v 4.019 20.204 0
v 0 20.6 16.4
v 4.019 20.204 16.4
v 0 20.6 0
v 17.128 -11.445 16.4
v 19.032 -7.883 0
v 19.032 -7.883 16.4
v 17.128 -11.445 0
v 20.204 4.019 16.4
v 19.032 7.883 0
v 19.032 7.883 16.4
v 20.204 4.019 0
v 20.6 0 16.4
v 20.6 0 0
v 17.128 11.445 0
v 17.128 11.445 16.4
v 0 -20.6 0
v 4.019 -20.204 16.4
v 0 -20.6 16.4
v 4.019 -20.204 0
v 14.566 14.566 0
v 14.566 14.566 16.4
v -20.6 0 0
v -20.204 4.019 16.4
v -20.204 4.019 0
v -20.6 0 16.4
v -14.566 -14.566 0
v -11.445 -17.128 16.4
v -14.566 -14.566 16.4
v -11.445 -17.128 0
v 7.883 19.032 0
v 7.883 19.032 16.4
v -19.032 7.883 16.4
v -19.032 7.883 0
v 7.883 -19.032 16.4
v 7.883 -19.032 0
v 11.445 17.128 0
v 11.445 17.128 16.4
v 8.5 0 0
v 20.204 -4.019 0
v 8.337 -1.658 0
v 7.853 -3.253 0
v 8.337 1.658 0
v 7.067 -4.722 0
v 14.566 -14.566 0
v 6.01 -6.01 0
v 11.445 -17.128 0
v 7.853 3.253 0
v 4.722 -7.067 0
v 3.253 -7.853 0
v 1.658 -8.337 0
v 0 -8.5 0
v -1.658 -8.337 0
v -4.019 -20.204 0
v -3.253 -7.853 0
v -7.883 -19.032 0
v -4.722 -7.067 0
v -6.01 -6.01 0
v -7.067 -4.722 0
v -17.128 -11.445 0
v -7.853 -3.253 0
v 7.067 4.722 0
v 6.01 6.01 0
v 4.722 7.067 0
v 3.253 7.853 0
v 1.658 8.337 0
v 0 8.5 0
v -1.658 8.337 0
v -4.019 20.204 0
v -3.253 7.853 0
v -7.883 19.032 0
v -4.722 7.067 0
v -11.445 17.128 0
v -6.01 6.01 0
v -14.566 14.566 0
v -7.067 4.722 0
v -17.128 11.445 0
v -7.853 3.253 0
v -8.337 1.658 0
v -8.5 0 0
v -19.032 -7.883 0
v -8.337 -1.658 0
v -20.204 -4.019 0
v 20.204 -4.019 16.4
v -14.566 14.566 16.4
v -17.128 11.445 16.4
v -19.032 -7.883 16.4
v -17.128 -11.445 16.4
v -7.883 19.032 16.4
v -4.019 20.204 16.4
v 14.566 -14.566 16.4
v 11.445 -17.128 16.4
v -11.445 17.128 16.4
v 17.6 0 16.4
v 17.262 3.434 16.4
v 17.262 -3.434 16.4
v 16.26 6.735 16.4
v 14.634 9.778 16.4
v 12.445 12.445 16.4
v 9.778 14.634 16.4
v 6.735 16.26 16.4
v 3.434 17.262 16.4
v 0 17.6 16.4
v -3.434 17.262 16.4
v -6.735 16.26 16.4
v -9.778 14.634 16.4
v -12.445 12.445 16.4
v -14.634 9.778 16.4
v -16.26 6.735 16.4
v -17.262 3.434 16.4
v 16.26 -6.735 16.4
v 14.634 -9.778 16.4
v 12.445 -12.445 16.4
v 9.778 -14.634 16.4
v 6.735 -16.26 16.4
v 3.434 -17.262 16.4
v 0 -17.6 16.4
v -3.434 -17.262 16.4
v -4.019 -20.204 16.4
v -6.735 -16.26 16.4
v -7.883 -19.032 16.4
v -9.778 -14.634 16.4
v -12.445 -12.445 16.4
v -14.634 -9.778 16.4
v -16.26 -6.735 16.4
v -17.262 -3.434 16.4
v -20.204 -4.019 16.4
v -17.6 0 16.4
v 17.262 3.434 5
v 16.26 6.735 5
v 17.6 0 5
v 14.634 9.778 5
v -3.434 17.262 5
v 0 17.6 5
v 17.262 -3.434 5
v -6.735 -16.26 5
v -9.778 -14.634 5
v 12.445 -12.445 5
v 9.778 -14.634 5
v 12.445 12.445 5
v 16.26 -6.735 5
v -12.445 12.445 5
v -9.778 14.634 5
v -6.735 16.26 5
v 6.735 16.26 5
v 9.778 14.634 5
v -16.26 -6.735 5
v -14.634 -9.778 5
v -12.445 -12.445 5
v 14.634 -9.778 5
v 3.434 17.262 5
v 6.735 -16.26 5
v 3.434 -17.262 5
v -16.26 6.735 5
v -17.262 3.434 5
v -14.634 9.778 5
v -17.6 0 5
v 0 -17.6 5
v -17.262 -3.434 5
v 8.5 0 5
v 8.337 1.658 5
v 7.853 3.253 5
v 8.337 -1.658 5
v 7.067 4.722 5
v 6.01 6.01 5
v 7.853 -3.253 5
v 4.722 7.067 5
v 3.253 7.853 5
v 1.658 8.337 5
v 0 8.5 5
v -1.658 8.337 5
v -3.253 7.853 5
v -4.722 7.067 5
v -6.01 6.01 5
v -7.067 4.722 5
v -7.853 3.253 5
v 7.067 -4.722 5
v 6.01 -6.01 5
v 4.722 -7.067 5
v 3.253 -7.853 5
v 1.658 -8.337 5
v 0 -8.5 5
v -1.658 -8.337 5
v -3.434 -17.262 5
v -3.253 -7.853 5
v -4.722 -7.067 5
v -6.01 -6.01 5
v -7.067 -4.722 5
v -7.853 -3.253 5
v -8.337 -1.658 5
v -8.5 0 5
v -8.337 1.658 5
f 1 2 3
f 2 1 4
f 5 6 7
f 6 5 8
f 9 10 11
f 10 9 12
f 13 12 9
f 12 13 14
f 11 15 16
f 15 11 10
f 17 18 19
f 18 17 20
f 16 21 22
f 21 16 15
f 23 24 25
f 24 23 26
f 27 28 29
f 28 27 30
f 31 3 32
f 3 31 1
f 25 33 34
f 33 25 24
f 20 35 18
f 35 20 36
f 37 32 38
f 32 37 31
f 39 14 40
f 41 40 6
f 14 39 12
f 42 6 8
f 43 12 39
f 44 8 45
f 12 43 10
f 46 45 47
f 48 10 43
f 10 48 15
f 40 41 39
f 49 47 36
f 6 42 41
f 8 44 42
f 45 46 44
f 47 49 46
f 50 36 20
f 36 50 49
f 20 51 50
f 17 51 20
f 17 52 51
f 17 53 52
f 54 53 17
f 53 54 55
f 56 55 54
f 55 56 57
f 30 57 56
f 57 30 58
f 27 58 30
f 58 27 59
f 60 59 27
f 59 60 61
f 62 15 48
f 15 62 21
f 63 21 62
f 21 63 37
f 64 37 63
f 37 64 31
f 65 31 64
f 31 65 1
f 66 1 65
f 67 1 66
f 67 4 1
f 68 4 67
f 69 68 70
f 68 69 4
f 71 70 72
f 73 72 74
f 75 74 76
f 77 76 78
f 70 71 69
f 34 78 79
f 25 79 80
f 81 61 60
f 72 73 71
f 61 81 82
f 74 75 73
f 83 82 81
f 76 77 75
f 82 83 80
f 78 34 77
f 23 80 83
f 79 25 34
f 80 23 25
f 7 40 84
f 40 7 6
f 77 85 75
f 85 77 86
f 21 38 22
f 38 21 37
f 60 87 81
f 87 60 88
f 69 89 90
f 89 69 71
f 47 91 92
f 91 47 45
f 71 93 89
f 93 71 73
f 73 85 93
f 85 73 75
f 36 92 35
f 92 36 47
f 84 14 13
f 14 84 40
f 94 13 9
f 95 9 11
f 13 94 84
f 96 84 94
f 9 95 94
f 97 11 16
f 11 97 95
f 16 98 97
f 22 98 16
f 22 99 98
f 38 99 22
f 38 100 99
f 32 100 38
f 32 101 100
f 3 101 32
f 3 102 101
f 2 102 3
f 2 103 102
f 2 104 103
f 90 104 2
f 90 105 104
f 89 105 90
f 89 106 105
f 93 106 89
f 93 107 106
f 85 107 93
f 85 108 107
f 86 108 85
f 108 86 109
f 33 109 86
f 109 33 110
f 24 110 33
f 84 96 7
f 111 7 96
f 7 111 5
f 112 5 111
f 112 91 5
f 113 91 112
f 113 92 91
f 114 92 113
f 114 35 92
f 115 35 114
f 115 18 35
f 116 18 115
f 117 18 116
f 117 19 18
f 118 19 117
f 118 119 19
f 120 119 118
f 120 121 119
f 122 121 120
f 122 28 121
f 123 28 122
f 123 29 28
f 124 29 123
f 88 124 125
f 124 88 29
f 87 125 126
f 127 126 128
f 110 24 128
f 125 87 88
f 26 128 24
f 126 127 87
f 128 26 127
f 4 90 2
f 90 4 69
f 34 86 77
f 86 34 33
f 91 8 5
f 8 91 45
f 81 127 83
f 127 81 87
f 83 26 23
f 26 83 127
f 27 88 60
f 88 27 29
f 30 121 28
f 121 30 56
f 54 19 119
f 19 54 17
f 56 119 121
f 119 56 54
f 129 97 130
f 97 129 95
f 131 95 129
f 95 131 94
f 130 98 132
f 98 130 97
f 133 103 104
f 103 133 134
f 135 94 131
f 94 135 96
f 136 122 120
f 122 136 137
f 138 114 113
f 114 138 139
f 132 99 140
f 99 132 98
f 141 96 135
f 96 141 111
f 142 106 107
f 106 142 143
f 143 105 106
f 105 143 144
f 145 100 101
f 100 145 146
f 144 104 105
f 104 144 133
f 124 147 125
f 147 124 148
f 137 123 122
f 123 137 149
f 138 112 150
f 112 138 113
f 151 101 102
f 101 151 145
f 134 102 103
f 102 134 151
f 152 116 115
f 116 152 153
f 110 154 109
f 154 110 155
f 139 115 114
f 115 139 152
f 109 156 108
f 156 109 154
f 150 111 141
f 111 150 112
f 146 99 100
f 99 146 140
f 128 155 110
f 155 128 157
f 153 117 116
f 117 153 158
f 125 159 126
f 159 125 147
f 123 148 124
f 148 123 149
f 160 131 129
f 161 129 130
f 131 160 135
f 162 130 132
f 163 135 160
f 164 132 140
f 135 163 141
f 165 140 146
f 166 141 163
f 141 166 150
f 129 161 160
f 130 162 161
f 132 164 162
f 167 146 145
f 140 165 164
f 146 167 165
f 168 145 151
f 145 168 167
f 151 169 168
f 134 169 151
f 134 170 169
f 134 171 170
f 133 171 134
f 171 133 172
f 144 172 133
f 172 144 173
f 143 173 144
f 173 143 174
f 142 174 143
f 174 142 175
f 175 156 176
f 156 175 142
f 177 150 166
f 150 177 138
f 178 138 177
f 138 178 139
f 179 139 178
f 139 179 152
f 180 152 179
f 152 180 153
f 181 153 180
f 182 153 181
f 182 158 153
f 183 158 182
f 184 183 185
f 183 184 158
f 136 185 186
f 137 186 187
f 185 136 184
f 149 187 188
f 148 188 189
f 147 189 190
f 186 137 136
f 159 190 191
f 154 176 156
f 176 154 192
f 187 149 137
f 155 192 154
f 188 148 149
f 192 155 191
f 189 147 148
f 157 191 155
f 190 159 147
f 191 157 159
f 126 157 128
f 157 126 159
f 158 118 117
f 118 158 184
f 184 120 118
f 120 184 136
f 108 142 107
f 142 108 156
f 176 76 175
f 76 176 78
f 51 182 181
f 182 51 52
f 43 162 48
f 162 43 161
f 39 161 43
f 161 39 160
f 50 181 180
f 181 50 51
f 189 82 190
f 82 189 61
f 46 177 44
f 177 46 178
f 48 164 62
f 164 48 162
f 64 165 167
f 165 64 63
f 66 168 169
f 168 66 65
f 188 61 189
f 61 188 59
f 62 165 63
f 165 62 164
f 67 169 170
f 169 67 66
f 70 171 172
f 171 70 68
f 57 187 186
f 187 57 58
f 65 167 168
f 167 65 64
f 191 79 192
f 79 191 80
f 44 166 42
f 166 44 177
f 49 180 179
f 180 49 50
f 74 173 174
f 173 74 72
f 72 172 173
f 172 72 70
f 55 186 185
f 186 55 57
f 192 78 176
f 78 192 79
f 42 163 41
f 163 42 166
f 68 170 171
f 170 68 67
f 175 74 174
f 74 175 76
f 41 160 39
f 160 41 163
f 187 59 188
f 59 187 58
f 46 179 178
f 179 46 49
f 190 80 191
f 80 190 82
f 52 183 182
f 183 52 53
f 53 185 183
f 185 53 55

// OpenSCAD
$fn = 32;

// ----------------------------------------------------------------------
// Bearing housing: seat for 6202 (35 x 11 mm), 41.2 mm body
// ----------------------------------------------------------------------

// --- parameters (mm) ---
housing_d = 41.2;         // housing outside diameter
housing_h = 16.4;         // overall housing height
wall_t = 3;               // wall thickness
seat_d = 35.2;            // 6202 seat, 0.2 mm clearance
seat_h = 11.4;            // pocket depth
shoulder = 5;             // shoulder under the bearing
pass_d = 17;              // shaft passage

module body() {
  cylinder(h = housing_h, d = housing_d);
}

difference() {
  union() {
    body();
  }
  translate([0, 0, housing_h - seat_h]) cylinder(h = seat_h + 1, d = seat_d);
  translate([0, 0, -1]) cylinder(h = housing_h - seat_h + 1, d = pass_d);
}
